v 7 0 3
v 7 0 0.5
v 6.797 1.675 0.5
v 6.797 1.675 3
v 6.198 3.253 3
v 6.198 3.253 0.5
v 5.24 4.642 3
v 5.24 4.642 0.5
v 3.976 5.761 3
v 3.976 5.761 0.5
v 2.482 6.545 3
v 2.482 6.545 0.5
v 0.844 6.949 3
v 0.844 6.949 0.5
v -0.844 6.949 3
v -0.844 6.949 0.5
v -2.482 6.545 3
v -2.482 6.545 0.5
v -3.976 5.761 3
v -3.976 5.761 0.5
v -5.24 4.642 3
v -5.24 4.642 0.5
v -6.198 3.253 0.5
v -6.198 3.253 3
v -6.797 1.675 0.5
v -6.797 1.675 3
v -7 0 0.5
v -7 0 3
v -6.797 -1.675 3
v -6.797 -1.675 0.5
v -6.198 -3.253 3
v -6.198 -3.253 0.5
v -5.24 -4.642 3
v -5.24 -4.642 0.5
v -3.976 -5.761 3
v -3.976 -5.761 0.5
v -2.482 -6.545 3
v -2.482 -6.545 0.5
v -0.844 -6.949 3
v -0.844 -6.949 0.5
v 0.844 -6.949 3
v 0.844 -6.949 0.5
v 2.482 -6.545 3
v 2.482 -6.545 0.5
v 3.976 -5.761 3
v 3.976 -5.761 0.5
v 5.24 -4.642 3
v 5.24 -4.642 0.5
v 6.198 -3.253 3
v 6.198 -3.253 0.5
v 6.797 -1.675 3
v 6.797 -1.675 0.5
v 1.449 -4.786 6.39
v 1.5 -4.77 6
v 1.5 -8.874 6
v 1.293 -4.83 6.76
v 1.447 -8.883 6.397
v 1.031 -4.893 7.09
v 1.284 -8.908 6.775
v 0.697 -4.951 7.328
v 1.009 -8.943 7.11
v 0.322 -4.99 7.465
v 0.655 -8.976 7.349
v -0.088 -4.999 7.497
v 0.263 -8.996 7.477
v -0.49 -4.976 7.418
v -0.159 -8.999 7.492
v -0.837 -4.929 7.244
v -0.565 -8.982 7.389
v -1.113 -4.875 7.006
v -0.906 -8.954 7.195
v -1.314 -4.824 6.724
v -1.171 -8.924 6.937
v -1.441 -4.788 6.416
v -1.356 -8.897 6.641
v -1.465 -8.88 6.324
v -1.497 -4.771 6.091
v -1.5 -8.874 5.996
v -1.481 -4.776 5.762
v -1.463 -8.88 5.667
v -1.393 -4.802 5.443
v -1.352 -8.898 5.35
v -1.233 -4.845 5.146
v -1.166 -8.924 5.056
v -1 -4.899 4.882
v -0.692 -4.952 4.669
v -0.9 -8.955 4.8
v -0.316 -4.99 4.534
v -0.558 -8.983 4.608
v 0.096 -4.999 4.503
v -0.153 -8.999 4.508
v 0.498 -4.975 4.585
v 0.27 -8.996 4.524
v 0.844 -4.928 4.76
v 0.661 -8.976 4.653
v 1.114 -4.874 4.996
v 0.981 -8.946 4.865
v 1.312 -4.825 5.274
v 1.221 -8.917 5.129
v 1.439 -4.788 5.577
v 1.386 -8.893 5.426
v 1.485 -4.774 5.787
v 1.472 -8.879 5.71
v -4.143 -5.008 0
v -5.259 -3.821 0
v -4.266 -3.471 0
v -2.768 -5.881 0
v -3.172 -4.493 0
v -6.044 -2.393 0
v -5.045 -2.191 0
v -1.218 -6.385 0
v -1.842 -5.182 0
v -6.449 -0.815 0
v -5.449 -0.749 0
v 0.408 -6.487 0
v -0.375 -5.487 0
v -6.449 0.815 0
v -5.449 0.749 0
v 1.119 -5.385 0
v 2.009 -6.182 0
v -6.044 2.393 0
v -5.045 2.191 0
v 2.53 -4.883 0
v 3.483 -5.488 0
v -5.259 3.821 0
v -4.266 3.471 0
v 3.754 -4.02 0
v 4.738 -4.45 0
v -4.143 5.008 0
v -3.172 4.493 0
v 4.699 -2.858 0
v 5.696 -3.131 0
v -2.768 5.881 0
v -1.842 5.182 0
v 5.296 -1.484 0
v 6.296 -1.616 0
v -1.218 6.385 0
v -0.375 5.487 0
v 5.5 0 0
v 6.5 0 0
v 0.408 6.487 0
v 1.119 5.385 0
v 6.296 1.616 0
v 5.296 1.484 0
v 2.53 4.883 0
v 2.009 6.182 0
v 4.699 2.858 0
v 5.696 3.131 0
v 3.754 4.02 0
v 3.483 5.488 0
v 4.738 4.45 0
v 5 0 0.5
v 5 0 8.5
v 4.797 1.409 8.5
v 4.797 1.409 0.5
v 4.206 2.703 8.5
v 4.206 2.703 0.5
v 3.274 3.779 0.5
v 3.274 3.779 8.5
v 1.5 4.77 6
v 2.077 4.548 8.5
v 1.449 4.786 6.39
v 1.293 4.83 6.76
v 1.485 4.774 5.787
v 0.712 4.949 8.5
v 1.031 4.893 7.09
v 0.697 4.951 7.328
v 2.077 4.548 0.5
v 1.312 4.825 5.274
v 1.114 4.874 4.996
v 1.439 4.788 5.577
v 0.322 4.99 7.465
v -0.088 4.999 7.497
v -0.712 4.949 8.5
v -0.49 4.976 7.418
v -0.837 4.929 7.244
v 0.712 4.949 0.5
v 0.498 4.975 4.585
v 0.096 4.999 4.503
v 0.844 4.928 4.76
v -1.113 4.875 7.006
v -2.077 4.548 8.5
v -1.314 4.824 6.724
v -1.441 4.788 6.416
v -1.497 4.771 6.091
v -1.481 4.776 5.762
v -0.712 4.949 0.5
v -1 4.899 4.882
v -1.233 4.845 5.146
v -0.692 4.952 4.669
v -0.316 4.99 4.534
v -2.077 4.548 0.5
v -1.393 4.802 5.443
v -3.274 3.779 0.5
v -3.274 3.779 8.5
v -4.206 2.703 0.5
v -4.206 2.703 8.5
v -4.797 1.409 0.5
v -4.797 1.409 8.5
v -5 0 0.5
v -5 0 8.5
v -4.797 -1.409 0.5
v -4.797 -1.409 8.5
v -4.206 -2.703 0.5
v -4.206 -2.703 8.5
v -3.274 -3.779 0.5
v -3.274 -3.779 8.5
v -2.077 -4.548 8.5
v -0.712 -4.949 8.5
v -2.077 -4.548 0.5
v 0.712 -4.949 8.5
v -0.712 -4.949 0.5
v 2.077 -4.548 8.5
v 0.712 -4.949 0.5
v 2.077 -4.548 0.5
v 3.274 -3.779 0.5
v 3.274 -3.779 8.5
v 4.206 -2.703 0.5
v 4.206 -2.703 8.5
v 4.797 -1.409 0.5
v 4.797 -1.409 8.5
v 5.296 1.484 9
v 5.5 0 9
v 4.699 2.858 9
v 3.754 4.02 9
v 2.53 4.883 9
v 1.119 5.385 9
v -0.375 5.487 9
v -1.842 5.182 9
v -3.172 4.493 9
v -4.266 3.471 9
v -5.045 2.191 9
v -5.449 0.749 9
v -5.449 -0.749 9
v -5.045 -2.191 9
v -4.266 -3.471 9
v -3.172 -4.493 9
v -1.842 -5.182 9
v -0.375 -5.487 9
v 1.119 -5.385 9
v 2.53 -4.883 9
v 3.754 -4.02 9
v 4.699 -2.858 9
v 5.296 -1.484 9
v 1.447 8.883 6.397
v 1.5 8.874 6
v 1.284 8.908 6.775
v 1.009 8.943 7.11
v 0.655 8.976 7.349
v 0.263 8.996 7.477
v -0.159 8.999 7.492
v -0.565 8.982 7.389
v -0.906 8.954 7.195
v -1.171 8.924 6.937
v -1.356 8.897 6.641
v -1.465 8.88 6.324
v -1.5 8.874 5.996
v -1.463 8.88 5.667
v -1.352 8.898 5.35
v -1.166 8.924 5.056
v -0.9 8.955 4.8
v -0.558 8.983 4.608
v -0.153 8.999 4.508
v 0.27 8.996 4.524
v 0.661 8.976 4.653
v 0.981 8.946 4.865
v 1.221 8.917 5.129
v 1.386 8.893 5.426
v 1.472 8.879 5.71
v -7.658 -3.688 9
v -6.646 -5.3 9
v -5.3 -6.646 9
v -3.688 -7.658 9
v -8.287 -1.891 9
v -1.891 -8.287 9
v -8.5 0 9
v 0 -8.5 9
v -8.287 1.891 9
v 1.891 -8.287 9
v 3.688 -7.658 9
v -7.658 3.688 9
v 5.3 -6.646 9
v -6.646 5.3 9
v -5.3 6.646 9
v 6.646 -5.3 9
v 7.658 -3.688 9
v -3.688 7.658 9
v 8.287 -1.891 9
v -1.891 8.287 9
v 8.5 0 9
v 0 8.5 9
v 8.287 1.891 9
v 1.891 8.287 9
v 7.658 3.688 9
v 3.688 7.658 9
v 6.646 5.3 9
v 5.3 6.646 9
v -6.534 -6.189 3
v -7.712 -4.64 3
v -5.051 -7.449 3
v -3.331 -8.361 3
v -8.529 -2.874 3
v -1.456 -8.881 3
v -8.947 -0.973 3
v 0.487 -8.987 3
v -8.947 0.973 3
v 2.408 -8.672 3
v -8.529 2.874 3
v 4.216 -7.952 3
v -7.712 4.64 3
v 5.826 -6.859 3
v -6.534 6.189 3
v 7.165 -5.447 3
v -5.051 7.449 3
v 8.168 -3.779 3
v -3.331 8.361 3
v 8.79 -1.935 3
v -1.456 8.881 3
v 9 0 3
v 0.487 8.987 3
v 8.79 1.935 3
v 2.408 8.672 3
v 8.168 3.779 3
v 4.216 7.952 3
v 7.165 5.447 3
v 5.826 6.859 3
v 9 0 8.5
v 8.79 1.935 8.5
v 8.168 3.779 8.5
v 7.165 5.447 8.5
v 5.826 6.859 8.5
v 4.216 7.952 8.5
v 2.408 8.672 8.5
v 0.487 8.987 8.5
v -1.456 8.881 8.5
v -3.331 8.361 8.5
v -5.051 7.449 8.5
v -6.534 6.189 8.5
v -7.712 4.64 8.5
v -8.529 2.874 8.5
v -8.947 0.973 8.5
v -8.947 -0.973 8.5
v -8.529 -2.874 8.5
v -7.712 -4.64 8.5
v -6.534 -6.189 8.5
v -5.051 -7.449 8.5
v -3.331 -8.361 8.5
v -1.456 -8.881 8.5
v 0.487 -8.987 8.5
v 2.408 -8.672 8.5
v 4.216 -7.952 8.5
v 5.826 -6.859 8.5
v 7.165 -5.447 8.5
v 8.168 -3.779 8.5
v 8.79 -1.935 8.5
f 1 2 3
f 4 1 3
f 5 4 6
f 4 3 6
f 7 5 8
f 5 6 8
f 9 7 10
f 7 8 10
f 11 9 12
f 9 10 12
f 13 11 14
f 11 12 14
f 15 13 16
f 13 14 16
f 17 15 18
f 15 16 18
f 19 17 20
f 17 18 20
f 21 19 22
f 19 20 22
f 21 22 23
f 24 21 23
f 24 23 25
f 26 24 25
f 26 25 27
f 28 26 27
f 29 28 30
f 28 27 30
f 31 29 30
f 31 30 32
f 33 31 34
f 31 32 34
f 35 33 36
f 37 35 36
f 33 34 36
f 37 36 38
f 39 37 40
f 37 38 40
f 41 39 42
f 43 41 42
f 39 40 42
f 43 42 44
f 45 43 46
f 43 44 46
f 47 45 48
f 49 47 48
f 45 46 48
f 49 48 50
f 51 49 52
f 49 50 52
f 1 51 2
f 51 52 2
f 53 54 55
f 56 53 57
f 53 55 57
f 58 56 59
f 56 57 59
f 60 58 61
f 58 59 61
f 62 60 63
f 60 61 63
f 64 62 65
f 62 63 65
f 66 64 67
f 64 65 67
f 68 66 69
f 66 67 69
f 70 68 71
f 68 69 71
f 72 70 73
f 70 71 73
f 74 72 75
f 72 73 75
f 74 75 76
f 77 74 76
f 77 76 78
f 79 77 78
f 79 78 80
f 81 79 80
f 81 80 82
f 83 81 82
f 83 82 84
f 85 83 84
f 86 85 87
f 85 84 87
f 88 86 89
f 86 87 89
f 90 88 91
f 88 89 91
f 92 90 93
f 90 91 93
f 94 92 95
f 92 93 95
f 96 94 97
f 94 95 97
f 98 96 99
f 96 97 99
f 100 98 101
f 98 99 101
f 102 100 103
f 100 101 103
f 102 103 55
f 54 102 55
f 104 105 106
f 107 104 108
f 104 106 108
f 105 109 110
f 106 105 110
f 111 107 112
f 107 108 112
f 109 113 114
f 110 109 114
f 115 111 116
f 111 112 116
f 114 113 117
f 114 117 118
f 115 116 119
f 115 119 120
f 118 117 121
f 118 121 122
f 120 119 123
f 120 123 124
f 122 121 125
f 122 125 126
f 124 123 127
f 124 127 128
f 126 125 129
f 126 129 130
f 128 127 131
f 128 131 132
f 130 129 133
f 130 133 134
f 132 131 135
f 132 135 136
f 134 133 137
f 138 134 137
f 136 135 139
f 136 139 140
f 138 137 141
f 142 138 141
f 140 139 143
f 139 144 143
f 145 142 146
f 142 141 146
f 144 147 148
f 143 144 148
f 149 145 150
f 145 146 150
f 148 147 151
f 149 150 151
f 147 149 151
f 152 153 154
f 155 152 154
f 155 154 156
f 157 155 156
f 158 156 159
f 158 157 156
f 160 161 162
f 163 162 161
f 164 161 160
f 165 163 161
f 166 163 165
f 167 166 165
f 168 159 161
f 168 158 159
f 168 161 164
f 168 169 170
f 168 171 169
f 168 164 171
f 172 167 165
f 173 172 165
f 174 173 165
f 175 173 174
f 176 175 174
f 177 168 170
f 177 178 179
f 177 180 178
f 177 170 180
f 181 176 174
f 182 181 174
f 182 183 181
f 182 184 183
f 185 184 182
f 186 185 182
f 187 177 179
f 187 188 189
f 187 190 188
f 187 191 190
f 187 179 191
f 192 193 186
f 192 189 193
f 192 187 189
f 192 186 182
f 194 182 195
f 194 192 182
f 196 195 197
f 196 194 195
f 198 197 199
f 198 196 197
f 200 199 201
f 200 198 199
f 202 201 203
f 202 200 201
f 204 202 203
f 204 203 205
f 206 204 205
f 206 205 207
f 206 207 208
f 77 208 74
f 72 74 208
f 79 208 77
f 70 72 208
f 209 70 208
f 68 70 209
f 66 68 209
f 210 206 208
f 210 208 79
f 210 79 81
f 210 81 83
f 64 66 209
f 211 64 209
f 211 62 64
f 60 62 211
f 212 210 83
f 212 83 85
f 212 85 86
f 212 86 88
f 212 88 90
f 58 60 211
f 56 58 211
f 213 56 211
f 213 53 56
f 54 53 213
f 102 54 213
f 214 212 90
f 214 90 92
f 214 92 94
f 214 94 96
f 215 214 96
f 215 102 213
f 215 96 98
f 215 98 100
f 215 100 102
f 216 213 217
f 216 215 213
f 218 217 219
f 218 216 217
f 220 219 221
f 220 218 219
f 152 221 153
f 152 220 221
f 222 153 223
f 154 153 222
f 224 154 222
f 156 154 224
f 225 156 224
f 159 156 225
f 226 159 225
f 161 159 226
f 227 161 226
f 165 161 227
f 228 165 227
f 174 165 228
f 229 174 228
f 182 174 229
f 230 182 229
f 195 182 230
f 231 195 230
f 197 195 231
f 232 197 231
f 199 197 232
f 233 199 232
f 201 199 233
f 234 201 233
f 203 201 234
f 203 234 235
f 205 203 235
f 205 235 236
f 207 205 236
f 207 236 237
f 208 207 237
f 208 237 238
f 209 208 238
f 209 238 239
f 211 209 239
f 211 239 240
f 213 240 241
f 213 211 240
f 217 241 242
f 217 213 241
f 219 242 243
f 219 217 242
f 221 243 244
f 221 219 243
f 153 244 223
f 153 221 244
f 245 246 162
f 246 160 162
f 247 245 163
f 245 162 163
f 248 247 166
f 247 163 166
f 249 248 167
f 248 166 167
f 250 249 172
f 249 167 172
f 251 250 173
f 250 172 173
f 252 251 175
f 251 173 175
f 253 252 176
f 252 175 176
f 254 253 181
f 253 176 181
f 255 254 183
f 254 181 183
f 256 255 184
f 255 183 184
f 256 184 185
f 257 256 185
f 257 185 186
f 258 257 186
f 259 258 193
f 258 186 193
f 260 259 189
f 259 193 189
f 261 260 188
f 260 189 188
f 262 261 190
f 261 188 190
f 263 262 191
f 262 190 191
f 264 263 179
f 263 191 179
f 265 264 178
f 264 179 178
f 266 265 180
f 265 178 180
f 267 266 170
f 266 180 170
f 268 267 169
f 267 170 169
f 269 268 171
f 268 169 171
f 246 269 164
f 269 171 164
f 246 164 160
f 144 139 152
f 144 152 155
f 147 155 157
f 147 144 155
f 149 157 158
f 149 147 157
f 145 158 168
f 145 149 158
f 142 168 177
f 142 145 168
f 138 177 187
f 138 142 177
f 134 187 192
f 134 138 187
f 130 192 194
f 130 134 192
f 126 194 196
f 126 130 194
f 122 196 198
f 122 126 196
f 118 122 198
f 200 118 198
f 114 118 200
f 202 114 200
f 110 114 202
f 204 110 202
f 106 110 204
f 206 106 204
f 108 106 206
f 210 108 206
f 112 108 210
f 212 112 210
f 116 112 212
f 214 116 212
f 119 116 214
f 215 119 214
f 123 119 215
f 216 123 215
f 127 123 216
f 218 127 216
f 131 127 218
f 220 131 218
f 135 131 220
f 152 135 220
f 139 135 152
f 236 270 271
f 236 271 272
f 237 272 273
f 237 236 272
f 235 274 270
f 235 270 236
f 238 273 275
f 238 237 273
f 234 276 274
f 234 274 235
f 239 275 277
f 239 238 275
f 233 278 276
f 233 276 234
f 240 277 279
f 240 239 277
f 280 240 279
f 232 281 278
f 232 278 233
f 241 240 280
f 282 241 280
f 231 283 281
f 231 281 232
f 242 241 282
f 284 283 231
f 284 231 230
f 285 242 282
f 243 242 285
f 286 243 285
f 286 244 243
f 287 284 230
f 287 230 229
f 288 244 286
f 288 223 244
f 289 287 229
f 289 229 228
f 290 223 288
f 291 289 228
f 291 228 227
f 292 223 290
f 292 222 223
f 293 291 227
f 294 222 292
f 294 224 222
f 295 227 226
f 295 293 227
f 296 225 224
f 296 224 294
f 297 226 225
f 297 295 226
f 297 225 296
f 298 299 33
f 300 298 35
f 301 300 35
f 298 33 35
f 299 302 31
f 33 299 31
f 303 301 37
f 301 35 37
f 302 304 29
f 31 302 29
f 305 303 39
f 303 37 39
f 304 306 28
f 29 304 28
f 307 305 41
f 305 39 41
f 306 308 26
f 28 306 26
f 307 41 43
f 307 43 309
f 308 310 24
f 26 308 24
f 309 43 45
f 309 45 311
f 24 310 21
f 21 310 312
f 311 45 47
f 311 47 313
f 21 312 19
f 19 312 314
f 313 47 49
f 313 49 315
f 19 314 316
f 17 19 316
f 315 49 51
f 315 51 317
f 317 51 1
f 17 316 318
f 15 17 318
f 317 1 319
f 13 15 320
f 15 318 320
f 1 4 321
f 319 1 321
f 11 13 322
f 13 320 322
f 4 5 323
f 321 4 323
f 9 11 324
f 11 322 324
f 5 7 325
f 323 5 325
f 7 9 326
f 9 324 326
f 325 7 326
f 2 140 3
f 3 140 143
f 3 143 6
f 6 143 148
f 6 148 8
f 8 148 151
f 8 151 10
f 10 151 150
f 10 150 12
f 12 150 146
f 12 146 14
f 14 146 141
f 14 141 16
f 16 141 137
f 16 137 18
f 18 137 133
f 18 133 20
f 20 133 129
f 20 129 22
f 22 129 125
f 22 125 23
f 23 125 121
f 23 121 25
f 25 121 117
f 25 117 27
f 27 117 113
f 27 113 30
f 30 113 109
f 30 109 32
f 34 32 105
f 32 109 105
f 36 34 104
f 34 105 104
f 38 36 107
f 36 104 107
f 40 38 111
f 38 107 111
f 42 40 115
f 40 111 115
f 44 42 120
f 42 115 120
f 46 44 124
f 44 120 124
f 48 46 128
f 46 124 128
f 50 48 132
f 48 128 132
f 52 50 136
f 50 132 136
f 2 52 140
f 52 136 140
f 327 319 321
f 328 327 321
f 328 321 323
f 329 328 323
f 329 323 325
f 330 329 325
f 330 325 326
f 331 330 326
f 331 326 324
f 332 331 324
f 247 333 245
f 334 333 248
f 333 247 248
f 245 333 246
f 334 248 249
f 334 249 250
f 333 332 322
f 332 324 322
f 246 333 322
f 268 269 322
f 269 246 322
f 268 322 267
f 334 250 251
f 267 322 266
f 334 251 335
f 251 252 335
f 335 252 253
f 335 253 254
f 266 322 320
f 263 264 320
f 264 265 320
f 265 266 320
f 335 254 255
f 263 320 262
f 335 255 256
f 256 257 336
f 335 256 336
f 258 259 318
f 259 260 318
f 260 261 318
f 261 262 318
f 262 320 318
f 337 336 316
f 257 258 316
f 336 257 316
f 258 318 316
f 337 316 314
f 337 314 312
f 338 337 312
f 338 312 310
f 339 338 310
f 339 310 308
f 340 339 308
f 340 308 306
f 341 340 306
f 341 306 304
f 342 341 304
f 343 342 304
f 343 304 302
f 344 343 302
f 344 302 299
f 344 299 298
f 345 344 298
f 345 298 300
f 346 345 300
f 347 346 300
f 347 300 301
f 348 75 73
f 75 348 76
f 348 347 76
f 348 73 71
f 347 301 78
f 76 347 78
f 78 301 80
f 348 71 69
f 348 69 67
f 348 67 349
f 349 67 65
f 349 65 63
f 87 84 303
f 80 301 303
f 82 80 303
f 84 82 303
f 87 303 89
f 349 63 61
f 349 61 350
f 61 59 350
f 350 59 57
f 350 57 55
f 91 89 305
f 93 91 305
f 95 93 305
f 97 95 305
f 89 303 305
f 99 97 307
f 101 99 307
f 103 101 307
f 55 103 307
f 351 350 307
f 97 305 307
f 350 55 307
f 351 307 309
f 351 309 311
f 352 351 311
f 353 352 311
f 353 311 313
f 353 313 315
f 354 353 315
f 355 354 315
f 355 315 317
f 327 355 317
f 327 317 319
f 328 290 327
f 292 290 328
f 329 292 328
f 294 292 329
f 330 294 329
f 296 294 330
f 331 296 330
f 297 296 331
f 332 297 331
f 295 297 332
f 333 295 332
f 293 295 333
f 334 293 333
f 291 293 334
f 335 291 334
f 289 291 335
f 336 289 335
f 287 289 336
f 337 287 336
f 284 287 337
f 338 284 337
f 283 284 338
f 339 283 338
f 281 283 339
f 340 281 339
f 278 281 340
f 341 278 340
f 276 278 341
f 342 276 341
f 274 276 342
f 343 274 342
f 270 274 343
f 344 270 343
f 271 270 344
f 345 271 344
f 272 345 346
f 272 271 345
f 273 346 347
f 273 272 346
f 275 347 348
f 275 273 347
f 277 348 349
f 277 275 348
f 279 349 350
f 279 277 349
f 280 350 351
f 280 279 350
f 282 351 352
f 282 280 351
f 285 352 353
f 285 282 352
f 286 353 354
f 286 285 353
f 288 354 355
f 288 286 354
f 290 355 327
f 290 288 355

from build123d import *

# Parameters (mm, degrees)
F0_R     = 7
F0_R_2   = 5
F1_DEPTH = 3
F2_R     = 9
F2_R_2   = 5
F3_DEPTH = 6
F4_R     = 1.5
F5_DEPTH = 12.5
F6_SIZE  = 0.5


with BuildPart() as f1:
    # F0 (on Top) → F1 (new body)
    with BuildSketch(Plane.XY):
        Circle(F0_R)
        Circle(F0_R_2, mode=Mode.SUBTRACT)
    extrude(amount=F1_DEPTH)

    # F2 (on face) → F3 (join)
    with BuildSketch(Plane.XY.offset(3)):
        Circle(F2_R)
        Circle(F2_R_2, mode=Mode.SUBTRACT)
    extrude(amount=F3_DEPTH)

    # F4 (on Front) → F5 (cut, symmetric)
    with BuildSketch(Plane.XZ):
        with Locations((0, 6)):
            Circle(F4_R)
    extrude(amount=F5_DEPTH, both=True, mode=Mode.SUBTRACT)

    # F6
    f6_edges = [f1.edges().sort_by_distance(p)[0] for p in [
        (-9, 0, 9),
        (-7, 0, 0),
        (-5, 0, 9),
        (-5, 0, 0),
    ]]
    chamfer(f6_edges, length=F6_SIZE)


solid = f1.part
